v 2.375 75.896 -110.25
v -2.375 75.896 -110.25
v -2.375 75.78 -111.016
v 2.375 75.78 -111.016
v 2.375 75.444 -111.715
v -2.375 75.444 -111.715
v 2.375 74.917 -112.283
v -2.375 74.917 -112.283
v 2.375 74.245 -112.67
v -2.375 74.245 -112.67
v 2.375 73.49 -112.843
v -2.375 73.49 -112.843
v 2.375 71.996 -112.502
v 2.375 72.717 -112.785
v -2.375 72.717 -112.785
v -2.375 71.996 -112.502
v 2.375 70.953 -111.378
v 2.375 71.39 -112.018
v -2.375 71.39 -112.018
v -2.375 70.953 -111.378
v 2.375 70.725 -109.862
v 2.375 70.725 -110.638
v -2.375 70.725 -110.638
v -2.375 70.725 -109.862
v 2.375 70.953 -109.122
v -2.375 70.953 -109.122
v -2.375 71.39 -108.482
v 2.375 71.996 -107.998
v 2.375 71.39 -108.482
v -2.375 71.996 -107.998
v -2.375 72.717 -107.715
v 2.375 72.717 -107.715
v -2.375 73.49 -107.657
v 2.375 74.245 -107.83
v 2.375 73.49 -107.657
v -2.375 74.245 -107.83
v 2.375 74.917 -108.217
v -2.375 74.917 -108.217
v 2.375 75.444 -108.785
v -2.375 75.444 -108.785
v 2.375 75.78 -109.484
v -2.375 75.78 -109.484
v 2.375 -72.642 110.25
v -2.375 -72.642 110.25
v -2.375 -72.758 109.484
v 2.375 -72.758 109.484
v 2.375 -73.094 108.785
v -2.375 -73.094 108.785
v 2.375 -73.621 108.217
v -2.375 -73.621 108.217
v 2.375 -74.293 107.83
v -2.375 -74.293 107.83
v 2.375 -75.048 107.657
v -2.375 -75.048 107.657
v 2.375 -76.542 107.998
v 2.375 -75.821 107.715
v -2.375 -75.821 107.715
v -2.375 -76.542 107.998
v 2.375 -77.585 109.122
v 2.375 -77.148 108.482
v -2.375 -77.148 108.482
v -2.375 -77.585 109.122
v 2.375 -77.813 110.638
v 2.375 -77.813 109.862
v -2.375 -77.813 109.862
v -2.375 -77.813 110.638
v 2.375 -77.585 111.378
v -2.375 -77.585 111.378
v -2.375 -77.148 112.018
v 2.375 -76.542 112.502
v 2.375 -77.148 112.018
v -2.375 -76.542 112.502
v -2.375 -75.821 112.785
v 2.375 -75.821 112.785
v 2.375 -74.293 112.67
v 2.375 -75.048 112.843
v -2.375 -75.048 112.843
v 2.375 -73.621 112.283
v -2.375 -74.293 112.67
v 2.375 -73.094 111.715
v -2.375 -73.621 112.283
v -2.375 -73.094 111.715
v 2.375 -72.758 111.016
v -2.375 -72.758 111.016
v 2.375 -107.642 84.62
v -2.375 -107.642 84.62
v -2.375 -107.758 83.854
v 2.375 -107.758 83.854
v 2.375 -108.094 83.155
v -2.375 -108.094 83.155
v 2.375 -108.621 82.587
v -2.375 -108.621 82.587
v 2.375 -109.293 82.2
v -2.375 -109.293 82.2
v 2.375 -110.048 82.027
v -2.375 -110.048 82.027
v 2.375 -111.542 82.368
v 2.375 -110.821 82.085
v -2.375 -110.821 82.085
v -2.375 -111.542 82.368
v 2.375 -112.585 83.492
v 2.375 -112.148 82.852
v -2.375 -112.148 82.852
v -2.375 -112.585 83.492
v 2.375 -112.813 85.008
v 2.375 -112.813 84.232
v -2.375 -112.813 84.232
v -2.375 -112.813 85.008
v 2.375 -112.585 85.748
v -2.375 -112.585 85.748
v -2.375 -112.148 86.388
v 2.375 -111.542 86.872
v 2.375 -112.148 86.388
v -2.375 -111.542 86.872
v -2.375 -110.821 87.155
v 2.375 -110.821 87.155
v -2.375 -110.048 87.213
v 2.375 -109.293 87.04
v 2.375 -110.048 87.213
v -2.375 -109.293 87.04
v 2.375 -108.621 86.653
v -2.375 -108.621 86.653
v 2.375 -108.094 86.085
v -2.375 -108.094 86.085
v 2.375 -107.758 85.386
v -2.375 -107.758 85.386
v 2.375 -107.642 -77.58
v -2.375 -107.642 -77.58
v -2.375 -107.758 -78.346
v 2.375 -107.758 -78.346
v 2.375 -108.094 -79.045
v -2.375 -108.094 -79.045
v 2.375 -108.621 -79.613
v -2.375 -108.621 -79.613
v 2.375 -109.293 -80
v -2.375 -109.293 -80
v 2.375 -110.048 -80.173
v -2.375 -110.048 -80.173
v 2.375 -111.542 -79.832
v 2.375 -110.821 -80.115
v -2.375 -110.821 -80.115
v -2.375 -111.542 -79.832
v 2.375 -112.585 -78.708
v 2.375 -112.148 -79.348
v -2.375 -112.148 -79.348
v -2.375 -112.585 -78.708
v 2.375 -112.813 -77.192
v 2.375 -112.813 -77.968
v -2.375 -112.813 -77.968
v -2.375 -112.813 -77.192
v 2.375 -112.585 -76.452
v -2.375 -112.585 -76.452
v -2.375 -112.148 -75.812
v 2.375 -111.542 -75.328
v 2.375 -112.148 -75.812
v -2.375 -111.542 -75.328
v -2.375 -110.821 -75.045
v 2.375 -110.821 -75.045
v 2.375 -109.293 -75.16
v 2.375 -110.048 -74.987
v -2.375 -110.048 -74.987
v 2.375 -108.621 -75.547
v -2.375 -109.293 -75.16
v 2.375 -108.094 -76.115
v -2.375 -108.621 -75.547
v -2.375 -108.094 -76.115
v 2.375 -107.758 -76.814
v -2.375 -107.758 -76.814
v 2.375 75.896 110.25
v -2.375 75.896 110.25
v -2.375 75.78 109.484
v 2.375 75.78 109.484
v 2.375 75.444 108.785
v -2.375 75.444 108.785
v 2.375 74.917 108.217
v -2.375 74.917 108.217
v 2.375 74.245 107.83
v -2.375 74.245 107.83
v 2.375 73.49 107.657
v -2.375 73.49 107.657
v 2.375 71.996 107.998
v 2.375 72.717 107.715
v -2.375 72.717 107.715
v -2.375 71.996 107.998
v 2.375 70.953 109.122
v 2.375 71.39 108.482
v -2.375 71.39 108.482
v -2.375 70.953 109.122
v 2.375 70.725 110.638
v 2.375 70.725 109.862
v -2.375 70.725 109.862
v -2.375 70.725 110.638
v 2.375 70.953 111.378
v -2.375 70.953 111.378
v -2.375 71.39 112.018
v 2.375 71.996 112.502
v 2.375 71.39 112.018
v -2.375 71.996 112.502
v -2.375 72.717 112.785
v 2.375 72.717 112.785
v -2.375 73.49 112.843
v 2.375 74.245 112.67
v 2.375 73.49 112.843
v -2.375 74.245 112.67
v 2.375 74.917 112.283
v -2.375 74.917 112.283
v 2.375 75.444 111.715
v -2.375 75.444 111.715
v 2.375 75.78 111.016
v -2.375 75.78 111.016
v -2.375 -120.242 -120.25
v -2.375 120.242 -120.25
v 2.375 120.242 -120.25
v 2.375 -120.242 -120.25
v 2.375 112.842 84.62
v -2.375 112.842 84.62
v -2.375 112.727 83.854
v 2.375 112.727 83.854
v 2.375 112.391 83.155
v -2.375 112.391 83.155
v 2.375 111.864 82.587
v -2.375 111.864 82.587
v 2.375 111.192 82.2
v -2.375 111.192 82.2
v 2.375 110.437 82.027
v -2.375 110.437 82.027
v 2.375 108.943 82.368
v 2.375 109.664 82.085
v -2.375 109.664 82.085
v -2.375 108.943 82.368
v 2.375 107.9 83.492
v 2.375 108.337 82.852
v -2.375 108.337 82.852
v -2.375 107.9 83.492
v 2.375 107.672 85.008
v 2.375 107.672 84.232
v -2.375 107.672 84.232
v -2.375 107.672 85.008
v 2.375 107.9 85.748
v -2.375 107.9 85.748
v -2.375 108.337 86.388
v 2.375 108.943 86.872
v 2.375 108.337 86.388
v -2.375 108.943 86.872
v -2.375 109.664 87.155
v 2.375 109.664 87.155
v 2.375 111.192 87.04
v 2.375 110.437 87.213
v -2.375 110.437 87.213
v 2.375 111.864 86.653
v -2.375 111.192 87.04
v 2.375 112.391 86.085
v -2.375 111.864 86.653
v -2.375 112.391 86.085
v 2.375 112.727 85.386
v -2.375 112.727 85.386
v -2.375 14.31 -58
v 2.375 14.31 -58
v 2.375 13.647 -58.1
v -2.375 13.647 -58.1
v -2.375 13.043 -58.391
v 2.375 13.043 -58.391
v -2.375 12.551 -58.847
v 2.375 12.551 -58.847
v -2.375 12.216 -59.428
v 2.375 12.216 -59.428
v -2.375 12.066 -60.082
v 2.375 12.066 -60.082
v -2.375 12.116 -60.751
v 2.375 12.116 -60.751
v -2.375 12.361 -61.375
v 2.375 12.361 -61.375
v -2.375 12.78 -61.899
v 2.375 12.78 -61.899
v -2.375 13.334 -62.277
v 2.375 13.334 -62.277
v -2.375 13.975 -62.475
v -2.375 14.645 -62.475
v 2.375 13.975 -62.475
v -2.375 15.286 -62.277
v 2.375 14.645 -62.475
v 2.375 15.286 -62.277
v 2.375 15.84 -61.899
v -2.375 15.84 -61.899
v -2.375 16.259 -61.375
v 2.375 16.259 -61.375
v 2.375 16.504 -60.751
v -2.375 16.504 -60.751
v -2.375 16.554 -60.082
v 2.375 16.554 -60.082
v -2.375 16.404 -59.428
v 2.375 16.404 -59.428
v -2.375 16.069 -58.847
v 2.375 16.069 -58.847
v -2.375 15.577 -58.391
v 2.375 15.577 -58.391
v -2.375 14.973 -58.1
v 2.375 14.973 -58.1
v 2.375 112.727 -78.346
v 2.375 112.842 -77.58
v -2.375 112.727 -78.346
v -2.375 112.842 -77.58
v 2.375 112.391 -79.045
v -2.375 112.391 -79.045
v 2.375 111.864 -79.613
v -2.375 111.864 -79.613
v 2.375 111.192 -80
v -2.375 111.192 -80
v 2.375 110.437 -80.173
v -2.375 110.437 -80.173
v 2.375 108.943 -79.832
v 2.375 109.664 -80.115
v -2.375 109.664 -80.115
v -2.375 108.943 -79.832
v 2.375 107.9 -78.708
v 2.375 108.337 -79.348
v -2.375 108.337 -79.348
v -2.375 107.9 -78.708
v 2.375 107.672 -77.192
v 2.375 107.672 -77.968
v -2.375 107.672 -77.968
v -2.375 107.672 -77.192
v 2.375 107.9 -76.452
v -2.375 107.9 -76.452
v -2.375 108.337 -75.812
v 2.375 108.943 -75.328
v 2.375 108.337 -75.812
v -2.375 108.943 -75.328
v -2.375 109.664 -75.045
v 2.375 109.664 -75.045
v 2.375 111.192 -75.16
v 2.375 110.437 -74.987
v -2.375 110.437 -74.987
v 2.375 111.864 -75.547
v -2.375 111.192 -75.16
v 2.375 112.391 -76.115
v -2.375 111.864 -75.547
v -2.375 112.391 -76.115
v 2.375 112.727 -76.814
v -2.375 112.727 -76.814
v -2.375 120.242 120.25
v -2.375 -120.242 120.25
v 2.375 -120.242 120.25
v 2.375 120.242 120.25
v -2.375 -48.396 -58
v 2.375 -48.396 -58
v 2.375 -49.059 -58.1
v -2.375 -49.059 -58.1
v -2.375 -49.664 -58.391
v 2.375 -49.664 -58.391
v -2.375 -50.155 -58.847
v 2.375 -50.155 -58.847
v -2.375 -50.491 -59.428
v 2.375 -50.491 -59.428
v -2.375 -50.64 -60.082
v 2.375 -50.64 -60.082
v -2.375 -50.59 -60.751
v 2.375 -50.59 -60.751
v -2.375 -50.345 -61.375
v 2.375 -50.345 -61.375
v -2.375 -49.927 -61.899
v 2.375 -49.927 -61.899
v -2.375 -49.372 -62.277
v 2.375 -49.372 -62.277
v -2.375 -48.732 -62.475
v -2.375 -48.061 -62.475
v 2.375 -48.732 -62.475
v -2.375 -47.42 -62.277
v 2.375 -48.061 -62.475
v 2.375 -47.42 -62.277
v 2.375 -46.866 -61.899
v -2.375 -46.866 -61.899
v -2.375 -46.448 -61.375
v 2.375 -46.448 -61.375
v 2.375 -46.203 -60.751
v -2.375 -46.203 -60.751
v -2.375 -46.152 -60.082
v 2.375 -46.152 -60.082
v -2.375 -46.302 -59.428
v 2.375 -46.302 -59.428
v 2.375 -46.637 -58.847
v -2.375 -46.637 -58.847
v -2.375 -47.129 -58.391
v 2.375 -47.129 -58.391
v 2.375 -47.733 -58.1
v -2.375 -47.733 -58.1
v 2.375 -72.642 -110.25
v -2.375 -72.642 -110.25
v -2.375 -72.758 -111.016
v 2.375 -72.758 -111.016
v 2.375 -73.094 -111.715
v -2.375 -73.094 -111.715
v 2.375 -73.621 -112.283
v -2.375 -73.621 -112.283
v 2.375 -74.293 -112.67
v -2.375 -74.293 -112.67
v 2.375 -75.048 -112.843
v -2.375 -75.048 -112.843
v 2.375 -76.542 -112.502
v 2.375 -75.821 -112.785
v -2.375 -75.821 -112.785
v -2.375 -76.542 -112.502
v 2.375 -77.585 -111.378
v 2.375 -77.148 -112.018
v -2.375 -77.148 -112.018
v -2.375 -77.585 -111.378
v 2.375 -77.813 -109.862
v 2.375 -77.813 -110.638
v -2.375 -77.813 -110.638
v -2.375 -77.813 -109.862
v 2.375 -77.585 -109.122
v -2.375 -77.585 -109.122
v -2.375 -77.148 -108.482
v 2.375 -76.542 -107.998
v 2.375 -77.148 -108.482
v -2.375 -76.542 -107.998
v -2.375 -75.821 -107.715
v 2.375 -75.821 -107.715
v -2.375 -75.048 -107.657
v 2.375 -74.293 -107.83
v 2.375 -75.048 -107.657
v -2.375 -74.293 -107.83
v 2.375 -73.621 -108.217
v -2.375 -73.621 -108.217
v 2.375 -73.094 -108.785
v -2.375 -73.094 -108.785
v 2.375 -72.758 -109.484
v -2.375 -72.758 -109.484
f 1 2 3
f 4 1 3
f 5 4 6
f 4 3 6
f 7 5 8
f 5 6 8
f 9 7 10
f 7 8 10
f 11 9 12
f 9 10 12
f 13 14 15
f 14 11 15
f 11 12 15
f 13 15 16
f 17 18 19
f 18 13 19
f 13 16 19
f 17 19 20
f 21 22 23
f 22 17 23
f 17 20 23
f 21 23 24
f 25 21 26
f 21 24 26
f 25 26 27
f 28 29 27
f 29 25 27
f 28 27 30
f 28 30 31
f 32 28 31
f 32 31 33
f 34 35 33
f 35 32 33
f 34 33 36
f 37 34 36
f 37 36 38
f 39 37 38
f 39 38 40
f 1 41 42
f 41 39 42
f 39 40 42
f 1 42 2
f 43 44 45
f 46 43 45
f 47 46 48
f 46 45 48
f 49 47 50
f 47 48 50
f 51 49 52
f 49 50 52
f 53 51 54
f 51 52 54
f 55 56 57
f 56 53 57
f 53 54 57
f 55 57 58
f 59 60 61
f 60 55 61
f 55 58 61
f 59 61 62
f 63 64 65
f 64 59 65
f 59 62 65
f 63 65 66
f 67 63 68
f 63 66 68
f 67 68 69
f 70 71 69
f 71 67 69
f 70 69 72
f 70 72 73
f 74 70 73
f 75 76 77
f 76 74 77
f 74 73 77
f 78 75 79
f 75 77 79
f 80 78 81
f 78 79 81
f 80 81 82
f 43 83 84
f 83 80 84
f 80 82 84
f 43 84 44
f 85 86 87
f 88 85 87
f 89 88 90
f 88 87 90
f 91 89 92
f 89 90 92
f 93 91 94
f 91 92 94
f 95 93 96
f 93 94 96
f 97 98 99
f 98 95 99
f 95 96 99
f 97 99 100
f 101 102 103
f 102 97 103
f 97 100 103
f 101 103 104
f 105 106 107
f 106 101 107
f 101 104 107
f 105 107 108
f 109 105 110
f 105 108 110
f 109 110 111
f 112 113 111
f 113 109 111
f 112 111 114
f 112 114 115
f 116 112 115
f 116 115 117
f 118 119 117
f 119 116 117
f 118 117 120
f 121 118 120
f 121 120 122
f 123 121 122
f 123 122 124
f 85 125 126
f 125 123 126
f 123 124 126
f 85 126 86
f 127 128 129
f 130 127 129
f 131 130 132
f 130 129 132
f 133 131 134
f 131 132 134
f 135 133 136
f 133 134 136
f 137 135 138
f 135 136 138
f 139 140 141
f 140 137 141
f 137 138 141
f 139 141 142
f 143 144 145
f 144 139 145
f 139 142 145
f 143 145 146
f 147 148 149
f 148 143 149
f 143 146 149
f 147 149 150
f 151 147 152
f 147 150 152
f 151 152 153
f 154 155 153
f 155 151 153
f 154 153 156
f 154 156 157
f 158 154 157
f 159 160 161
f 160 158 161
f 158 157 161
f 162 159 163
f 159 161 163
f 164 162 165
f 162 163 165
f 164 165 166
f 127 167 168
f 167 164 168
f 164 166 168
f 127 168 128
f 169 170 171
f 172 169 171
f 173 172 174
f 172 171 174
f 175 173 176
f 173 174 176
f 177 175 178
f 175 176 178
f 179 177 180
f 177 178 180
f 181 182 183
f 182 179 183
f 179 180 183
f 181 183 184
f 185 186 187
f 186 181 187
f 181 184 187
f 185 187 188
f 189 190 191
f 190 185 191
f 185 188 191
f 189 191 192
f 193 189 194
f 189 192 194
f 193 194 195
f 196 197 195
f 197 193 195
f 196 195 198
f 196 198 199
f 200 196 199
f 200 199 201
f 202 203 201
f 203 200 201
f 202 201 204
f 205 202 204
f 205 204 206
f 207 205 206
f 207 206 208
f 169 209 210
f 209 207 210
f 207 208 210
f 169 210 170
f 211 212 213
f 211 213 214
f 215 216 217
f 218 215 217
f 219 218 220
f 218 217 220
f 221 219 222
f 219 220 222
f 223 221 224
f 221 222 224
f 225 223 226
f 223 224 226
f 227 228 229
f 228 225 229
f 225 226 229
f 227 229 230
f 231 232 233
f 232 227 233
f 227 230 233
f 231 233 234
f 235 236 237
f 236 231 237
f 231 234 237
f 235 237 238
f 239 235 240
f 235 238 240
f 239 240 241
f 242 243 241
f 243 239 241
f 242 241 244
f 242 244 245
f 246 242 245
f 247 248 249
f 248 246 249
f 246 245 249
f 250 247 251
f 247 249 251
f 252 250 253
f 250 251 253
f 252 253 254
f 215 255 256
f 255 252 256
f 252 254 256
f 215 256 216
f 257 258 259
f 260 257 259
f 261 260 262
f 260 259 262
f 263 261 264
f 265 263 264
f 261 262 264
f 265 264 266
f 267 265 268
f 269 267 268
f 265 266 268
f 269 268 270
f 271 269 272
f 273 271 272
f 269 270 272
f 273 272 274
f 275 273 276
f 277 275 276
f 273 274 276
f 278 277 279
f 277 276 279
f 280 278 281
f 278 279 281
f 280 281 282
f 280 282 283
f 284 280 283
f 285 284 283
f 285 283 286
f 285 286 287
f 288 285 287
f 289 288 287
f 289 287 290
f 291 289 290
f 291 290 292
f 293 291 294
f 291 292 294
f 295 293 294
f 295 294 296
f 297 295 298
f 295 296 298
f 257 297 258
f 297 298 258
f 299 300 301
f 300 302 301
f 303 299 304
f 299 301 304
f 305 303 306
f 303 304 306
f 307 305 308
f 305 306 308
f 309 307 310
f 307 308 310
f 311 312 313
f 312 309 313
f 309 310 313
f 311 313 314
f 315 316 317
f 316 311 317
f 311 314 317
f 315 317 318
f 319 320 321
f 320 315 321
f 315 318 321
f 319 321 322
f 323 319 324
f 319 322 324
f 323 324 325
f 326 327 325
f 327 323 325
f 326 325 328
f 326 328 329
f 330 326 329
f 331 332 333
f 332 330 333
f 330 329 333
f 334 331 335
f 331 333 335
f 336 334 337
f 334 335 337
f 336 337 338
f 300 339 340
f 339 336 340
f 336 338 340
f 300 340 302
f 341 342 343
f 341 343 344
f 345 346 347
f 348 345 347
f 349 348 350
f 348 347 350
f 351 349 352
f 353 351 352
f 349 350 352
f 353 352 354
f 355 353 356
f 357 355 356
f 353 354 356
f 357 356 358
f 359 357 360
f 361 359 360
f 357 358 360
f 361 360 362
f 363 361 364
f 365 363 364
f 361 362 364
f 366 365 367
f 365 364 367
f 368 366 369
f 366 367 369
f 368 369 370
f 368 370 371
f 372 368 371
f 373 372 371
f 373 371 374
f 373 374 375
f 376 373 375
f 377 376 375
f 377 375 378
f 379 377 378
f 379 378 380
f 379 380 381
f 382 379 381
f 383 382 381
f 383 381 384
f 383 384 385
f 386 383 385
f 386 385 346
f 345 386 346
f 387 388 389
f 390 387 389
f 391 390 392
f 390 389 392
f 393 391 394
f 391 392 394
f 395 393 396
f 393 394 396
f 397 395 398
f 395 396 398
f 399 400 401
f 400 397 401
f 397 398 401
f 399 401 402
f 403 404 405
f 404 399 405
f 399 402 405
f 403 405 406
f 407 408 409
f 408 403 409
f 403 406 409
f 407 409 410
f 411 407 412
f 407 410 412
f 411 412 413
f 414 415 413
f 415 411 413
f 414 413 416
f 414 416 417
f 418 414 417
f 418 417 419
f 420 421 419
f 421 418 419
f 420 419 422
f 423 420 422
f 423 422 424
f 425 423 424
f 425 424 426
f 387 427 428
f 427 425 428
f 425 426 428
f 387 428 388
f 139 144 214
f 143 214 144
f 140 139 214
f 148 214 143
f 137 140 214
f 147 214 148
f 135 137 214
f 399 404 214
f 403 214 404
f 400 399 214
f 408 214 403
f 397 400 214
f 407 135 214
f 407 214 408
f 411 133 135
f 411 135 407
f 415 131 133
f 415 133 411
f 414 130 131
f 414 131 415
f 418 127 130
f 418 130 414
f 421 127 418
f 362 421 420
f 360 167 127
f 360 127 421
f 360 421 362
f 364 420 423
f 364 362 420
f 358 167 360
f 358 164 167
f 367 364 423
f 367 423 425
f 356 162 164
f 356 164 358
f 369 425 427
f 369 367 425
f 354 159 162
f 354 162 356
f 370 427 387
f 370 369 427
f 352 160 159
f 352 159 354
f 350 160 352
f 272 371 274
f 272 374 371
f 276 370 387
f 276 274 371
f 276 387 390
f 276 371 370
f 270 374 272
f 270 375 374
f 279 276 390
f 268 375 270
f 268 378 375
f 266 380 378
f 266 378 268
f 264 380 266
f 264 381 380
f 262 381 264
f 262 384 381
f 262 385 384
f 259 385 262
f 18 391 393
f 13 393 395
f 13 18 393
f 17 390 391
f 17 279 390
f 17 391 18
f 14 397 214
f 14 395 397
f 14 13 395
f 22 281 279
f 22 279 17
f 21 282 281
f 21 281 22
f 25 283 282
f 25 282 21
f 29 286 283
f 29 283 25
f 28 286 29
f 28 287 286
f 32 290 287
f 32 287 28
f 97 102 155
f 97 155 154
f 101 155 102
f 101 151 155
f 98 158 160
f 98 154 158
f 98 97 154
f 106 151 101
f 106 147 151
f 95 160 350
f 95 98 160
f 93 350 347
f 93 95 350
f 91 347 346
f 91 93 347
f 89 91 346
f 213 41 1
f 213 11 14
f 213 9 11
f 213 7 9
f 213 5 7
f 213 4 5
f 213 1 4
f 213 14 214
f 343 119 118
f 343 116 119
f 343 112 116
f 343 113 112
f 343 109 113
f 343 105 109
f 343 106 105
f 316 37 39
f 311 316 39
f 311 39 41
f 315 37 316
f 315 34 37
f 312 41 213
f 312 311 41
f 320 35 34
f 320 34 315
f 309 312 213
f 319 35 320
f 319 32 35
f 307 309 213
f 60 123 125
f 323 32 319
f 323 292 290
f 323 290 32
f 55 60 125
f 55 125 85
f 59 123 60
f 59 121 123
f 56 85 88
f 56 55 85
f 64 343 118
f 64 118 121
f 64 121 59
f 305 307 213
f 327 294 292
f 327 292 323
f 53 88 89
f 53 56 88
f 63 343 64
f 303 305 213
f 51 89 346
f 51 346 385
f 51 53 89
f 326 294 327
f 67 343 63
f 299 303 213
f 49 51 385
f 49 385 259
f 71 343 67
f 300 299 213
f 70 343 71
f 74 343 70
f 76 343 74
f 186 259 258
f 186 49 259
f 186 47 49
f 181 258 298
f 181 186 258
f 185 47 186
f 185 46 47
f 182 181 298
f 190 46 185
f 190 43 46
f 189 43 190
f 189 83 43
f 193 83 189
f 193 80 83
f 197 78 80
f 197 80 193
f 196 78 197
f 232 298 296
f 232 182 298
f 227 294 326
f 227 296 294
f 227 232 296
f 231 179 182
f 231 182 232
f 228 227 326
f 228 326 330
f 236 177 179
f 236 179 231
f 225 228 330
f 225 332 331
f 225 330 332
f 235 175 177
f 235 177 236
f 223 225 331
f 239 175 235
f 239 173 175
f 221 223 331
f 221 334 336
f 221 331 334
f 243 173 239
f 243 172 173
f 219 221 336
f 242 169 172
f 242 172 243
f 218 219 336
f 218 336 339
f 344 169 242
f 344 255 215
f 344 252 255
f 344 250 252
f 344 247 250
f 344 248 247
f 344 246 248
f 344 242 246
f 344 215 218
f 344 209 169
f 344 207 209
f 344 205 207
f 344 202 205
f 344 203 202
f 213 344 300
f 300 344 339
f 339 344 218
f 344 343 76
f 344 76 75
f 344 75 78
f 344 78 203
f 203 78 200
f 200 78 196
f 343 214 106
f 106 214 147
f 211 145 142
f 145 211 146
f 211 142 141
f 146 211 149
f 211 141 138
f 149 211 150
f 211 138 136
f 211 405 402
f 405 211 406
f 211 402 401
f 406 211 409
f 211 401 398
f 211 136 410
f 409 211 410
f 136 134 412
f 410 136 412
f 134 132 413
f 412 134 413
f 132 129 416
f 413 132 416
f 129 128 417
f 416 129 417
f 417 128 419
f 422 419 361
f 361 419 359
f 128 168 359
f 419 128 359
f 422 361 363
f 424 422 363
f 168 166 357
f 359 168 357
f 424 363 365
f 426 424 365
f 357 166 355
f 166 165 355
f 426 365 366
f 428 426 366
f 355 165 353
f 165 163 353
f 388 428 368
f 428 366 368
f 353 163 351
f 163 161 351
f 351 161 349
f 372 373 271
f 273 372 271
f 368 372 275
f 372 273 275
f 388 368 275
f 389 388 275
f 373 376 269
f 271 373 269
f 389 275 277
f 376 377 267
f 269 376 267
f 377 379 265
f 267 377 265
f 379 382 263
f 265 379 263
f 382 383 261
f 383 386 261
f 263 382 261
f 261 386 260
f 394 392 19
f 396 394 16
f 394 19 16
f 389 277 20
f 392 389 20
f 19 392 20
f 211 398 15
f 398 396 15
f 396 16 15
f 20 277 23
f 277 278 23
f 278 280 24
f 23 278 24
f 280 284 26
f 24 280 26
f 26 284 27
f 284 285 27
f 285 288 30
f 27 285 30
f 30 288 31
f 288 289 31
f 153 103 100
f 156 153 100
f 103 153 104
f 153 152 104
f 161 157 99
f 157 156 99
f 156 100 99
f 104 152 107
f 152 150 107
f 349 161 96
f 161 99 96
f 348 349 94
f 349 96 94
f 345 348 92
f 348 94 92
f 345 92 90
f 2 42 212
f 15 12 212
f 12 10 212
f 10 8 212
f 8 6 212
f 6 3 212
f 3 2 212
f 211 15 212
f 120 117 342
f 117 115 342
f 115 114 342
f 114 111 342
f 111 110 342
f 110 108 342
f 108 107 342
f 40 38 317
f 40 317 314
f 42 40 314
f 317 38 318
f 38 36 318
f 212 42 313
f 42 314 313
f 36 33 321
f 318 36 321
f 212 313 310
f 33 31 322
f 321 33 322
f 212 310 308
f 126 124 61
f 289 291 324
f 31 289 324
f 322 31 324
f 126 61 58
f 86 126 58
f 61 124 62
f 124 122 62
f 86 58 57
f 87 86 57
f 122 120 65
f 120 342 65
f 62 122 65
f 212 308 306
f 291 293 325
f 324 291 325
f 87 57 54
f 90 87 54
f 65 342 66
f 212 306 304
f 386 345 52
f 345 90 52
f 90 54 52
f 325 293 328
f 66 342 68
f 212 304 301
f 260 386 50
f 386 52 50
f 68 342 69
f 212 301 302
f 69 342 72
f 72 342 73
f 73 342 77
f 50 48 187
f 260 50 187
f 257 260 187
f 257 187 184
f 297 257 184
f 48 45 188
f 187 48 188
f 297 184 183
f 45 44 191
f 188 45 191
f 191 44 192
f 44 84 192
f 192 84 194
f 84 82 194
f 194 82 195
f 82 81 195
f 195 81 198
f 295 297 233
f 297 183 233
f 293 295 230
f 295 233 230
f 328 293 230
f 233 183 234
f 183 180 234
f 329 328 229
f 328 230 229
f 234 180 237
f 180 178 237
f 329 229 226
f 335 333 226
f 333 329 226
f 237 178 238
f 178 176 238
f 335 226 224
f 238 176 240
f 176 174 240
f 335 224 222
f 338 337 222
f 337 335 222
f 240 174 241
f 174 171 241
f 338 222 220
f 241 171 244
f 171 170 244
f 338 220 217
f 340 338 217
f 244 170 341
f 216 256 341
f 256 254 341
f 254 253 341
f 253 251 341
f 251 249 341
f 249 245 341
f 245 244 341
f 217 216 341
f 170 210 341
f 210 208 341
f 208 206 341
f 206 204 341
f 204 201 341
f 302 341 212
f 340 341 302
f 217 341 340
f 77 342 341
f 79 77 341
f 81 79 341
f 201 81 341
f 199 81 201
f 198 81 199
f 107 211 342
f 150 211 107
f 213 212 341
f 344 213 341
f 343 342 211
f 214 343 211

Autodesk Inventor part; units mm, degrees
ref_plane "YZ Plane" through (0, 0, 0) normal (1, 0, 0) x (0, 1, 0)
ref_plane "XZ Plane" through (0, 0, 0) normal (0, 1, 0) x (-1, 0, 0)
ref_plane "XY Plane" through (0, 0, 0) normal (0, 0, 1) x (1, 0, 0)
sketch "Face" plane through (0, 0, 0) normal (0, 0, 1) x (1, 0, 0)
  circle A0 centre (230.4851, 204.87) radius 2.6
  circle A1 centre (45, 10) radius 2.6
  circle A2 centre (193.5381, 10) radius 2.6
  circle A3 centre (10, 204.87) radius 2.6
  circle A4 centre (193.5381, 230.5) radius 2.6
  circle A5 centre (10, 42.67) radius 2.6
  circle A6 centre (230.4851, 42.67) radius 2.6
  circle A7 centre (45, 230.5) radius 2.6
  line L0 (240.4851, 0) -> (0, 0)
  line L1 (240.4851, 0) -> (240.4851, 240.5)
  line L2 (0, 240.5) -> (240.4851, 240.5)
  line L3 (0, 240.5) -> (0, 0)
  point P0 (115.8277, 117.0745)
  point P1 (0, 0)
sketch "Sketch1" plane through (0, 0, 0) normal (1, 0, 0) x (0, 1, 0)
  circle A0 centre (110.2425, 84.62) radius 2.6
  circle A1 centre (-75.2425, -110.25) radius 2.6
  circle A2 centre (73.2955, -110.25) radius 2.6
  circle A3 centre (-110.2425, 84.62) radius 2.6
  circle A4 centre (73.2955, 110.25) radius 2.6
  circle A5 centre (-110.2425, -77.58) radius 2.6
  circle A6 centre (110.2425, -77.58) radius 2.6
  circle A7 centre (-75.2425, 110.25) radius 2.6
  line L0 (120.2425, -120.25) -> (-120.2425, -120.25)
  line L1 (120.2425, -120.25) -> (120.2425, 120.25)
  line L2 (-120.2425, 120.25) -> (120.2425, 120.25)
  line L3 (-120.2425, 120.25) -> (-120.2425, -120.25)
  point P0 (0, 0)
  point P1 (-120.2425, 0)
  point P2 (0, 120.25)
extrude "Extrusion1" add sketch "Sketch1" along normal mid plane 4.75
sketch "Sketch2" plane through (-2.375, 0, 0) normal (-1, 0, 0) x (0, 0, 1)
  arc A0 (-55.5931, 11.2793) -> (-64.9069, 11.2793) centre (-60.25, 14.31) ccw projected
  arc A1 (-64.9069, -45.3655) -> (-55.5931, -45.3655) centre (-60.25, -48.3962) ccw projected
hole "Hole1" at (-2.375, 14.31, -60.25) at (-2.375, -48.3962, -60.25) direction (1, 0, 0) diameter 4.5 end through all clearance for "Socket Head Cap Screw" size "M4" standard "Ansi Metric M Profile"
properties part number "BREEZE-M07"
